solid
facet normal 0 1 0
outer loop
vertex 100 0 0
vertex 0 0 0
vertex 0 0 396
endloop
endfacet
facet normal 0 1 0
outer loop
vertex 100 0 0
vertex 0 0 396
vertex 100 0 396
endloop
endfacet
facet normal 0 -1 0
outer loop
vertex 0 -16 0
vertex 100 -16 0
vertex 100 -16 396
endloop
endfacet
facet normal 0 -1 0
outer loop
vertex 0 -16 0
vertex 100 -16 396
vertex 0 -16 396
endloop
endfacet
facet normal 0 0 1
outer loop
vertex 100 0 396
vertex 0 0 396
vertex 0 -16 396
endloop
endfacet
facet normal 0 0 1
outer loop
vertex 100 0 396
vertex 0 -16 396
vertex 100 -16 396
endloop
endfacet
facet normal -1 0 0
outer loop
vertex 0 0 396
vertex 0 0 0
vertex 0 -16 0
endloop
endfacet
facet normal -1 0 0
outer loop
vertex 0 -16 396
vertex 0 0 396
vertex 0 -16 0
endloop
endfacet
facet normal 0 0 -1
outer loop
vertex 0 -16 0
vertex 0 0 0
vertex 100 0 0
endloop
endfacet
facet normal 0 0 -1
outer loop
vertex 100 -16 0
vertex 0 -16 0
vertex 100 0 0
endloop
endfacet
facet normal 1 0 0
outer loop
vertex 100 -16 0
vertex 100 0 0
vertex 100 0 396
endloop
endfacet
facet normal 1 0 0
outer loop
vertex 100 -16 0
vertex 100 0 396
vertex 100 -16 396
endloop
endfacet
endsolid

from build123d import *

# Parameters (mm, degrees)
F0_W     = 40.0536805391
F0_H     = 44.0229400992
F1_DEPTH = 25
F2_DEPTH = 16
F3_DEPTH = 100
F4_DEPTH = 1996
F5_DEPTH = 396


with BuildPart() as f1:
    # F0 (on Front) → F1 (new body)
    with BuildSketch(Plane.XZ):
        with Locations((20.0268402696, 22.0114700496)):
            Rectangle(F0_W, F0_H)
    extrude(amount=F1_DEPTH)

    # F2 (intersect): a face of the model
    f2_faces = [f1.faces().sort_by_distance(p)[0] for p in [
        (20.0268402696, 0, 22.0114700496),
    ]]
    extrude(f2_faces, amount=-F2_DEPTH, mode=Mode.INTERSECT)

    # F3 (add): a face of the model
    f3_faces = [f1.faces().sort_by_distance(p)[0] for p in [
        (0, -8, 22.0114700496),
    ]]
    extrude(f3_faces, amount=-F3_DEPTH)

    # F4 (add): a face of the model
    f4_faces = [f1.faces().sort_by_distance(p)[0] for p in [
        (50, -8, 0),
    ]]
    extrude(f4_faces, amount=-F4_DEPTH)

    # F5 (intersect): a face of the model
    f5_faces = [f1.faces().sort_by_distance(p)[0] for p in [
        (50, -8, 0),
    ]]
    extrude(f5_faces, amount=-F5_DEPTH, mode=Mode.INTERSECT)


solid = f1.part
